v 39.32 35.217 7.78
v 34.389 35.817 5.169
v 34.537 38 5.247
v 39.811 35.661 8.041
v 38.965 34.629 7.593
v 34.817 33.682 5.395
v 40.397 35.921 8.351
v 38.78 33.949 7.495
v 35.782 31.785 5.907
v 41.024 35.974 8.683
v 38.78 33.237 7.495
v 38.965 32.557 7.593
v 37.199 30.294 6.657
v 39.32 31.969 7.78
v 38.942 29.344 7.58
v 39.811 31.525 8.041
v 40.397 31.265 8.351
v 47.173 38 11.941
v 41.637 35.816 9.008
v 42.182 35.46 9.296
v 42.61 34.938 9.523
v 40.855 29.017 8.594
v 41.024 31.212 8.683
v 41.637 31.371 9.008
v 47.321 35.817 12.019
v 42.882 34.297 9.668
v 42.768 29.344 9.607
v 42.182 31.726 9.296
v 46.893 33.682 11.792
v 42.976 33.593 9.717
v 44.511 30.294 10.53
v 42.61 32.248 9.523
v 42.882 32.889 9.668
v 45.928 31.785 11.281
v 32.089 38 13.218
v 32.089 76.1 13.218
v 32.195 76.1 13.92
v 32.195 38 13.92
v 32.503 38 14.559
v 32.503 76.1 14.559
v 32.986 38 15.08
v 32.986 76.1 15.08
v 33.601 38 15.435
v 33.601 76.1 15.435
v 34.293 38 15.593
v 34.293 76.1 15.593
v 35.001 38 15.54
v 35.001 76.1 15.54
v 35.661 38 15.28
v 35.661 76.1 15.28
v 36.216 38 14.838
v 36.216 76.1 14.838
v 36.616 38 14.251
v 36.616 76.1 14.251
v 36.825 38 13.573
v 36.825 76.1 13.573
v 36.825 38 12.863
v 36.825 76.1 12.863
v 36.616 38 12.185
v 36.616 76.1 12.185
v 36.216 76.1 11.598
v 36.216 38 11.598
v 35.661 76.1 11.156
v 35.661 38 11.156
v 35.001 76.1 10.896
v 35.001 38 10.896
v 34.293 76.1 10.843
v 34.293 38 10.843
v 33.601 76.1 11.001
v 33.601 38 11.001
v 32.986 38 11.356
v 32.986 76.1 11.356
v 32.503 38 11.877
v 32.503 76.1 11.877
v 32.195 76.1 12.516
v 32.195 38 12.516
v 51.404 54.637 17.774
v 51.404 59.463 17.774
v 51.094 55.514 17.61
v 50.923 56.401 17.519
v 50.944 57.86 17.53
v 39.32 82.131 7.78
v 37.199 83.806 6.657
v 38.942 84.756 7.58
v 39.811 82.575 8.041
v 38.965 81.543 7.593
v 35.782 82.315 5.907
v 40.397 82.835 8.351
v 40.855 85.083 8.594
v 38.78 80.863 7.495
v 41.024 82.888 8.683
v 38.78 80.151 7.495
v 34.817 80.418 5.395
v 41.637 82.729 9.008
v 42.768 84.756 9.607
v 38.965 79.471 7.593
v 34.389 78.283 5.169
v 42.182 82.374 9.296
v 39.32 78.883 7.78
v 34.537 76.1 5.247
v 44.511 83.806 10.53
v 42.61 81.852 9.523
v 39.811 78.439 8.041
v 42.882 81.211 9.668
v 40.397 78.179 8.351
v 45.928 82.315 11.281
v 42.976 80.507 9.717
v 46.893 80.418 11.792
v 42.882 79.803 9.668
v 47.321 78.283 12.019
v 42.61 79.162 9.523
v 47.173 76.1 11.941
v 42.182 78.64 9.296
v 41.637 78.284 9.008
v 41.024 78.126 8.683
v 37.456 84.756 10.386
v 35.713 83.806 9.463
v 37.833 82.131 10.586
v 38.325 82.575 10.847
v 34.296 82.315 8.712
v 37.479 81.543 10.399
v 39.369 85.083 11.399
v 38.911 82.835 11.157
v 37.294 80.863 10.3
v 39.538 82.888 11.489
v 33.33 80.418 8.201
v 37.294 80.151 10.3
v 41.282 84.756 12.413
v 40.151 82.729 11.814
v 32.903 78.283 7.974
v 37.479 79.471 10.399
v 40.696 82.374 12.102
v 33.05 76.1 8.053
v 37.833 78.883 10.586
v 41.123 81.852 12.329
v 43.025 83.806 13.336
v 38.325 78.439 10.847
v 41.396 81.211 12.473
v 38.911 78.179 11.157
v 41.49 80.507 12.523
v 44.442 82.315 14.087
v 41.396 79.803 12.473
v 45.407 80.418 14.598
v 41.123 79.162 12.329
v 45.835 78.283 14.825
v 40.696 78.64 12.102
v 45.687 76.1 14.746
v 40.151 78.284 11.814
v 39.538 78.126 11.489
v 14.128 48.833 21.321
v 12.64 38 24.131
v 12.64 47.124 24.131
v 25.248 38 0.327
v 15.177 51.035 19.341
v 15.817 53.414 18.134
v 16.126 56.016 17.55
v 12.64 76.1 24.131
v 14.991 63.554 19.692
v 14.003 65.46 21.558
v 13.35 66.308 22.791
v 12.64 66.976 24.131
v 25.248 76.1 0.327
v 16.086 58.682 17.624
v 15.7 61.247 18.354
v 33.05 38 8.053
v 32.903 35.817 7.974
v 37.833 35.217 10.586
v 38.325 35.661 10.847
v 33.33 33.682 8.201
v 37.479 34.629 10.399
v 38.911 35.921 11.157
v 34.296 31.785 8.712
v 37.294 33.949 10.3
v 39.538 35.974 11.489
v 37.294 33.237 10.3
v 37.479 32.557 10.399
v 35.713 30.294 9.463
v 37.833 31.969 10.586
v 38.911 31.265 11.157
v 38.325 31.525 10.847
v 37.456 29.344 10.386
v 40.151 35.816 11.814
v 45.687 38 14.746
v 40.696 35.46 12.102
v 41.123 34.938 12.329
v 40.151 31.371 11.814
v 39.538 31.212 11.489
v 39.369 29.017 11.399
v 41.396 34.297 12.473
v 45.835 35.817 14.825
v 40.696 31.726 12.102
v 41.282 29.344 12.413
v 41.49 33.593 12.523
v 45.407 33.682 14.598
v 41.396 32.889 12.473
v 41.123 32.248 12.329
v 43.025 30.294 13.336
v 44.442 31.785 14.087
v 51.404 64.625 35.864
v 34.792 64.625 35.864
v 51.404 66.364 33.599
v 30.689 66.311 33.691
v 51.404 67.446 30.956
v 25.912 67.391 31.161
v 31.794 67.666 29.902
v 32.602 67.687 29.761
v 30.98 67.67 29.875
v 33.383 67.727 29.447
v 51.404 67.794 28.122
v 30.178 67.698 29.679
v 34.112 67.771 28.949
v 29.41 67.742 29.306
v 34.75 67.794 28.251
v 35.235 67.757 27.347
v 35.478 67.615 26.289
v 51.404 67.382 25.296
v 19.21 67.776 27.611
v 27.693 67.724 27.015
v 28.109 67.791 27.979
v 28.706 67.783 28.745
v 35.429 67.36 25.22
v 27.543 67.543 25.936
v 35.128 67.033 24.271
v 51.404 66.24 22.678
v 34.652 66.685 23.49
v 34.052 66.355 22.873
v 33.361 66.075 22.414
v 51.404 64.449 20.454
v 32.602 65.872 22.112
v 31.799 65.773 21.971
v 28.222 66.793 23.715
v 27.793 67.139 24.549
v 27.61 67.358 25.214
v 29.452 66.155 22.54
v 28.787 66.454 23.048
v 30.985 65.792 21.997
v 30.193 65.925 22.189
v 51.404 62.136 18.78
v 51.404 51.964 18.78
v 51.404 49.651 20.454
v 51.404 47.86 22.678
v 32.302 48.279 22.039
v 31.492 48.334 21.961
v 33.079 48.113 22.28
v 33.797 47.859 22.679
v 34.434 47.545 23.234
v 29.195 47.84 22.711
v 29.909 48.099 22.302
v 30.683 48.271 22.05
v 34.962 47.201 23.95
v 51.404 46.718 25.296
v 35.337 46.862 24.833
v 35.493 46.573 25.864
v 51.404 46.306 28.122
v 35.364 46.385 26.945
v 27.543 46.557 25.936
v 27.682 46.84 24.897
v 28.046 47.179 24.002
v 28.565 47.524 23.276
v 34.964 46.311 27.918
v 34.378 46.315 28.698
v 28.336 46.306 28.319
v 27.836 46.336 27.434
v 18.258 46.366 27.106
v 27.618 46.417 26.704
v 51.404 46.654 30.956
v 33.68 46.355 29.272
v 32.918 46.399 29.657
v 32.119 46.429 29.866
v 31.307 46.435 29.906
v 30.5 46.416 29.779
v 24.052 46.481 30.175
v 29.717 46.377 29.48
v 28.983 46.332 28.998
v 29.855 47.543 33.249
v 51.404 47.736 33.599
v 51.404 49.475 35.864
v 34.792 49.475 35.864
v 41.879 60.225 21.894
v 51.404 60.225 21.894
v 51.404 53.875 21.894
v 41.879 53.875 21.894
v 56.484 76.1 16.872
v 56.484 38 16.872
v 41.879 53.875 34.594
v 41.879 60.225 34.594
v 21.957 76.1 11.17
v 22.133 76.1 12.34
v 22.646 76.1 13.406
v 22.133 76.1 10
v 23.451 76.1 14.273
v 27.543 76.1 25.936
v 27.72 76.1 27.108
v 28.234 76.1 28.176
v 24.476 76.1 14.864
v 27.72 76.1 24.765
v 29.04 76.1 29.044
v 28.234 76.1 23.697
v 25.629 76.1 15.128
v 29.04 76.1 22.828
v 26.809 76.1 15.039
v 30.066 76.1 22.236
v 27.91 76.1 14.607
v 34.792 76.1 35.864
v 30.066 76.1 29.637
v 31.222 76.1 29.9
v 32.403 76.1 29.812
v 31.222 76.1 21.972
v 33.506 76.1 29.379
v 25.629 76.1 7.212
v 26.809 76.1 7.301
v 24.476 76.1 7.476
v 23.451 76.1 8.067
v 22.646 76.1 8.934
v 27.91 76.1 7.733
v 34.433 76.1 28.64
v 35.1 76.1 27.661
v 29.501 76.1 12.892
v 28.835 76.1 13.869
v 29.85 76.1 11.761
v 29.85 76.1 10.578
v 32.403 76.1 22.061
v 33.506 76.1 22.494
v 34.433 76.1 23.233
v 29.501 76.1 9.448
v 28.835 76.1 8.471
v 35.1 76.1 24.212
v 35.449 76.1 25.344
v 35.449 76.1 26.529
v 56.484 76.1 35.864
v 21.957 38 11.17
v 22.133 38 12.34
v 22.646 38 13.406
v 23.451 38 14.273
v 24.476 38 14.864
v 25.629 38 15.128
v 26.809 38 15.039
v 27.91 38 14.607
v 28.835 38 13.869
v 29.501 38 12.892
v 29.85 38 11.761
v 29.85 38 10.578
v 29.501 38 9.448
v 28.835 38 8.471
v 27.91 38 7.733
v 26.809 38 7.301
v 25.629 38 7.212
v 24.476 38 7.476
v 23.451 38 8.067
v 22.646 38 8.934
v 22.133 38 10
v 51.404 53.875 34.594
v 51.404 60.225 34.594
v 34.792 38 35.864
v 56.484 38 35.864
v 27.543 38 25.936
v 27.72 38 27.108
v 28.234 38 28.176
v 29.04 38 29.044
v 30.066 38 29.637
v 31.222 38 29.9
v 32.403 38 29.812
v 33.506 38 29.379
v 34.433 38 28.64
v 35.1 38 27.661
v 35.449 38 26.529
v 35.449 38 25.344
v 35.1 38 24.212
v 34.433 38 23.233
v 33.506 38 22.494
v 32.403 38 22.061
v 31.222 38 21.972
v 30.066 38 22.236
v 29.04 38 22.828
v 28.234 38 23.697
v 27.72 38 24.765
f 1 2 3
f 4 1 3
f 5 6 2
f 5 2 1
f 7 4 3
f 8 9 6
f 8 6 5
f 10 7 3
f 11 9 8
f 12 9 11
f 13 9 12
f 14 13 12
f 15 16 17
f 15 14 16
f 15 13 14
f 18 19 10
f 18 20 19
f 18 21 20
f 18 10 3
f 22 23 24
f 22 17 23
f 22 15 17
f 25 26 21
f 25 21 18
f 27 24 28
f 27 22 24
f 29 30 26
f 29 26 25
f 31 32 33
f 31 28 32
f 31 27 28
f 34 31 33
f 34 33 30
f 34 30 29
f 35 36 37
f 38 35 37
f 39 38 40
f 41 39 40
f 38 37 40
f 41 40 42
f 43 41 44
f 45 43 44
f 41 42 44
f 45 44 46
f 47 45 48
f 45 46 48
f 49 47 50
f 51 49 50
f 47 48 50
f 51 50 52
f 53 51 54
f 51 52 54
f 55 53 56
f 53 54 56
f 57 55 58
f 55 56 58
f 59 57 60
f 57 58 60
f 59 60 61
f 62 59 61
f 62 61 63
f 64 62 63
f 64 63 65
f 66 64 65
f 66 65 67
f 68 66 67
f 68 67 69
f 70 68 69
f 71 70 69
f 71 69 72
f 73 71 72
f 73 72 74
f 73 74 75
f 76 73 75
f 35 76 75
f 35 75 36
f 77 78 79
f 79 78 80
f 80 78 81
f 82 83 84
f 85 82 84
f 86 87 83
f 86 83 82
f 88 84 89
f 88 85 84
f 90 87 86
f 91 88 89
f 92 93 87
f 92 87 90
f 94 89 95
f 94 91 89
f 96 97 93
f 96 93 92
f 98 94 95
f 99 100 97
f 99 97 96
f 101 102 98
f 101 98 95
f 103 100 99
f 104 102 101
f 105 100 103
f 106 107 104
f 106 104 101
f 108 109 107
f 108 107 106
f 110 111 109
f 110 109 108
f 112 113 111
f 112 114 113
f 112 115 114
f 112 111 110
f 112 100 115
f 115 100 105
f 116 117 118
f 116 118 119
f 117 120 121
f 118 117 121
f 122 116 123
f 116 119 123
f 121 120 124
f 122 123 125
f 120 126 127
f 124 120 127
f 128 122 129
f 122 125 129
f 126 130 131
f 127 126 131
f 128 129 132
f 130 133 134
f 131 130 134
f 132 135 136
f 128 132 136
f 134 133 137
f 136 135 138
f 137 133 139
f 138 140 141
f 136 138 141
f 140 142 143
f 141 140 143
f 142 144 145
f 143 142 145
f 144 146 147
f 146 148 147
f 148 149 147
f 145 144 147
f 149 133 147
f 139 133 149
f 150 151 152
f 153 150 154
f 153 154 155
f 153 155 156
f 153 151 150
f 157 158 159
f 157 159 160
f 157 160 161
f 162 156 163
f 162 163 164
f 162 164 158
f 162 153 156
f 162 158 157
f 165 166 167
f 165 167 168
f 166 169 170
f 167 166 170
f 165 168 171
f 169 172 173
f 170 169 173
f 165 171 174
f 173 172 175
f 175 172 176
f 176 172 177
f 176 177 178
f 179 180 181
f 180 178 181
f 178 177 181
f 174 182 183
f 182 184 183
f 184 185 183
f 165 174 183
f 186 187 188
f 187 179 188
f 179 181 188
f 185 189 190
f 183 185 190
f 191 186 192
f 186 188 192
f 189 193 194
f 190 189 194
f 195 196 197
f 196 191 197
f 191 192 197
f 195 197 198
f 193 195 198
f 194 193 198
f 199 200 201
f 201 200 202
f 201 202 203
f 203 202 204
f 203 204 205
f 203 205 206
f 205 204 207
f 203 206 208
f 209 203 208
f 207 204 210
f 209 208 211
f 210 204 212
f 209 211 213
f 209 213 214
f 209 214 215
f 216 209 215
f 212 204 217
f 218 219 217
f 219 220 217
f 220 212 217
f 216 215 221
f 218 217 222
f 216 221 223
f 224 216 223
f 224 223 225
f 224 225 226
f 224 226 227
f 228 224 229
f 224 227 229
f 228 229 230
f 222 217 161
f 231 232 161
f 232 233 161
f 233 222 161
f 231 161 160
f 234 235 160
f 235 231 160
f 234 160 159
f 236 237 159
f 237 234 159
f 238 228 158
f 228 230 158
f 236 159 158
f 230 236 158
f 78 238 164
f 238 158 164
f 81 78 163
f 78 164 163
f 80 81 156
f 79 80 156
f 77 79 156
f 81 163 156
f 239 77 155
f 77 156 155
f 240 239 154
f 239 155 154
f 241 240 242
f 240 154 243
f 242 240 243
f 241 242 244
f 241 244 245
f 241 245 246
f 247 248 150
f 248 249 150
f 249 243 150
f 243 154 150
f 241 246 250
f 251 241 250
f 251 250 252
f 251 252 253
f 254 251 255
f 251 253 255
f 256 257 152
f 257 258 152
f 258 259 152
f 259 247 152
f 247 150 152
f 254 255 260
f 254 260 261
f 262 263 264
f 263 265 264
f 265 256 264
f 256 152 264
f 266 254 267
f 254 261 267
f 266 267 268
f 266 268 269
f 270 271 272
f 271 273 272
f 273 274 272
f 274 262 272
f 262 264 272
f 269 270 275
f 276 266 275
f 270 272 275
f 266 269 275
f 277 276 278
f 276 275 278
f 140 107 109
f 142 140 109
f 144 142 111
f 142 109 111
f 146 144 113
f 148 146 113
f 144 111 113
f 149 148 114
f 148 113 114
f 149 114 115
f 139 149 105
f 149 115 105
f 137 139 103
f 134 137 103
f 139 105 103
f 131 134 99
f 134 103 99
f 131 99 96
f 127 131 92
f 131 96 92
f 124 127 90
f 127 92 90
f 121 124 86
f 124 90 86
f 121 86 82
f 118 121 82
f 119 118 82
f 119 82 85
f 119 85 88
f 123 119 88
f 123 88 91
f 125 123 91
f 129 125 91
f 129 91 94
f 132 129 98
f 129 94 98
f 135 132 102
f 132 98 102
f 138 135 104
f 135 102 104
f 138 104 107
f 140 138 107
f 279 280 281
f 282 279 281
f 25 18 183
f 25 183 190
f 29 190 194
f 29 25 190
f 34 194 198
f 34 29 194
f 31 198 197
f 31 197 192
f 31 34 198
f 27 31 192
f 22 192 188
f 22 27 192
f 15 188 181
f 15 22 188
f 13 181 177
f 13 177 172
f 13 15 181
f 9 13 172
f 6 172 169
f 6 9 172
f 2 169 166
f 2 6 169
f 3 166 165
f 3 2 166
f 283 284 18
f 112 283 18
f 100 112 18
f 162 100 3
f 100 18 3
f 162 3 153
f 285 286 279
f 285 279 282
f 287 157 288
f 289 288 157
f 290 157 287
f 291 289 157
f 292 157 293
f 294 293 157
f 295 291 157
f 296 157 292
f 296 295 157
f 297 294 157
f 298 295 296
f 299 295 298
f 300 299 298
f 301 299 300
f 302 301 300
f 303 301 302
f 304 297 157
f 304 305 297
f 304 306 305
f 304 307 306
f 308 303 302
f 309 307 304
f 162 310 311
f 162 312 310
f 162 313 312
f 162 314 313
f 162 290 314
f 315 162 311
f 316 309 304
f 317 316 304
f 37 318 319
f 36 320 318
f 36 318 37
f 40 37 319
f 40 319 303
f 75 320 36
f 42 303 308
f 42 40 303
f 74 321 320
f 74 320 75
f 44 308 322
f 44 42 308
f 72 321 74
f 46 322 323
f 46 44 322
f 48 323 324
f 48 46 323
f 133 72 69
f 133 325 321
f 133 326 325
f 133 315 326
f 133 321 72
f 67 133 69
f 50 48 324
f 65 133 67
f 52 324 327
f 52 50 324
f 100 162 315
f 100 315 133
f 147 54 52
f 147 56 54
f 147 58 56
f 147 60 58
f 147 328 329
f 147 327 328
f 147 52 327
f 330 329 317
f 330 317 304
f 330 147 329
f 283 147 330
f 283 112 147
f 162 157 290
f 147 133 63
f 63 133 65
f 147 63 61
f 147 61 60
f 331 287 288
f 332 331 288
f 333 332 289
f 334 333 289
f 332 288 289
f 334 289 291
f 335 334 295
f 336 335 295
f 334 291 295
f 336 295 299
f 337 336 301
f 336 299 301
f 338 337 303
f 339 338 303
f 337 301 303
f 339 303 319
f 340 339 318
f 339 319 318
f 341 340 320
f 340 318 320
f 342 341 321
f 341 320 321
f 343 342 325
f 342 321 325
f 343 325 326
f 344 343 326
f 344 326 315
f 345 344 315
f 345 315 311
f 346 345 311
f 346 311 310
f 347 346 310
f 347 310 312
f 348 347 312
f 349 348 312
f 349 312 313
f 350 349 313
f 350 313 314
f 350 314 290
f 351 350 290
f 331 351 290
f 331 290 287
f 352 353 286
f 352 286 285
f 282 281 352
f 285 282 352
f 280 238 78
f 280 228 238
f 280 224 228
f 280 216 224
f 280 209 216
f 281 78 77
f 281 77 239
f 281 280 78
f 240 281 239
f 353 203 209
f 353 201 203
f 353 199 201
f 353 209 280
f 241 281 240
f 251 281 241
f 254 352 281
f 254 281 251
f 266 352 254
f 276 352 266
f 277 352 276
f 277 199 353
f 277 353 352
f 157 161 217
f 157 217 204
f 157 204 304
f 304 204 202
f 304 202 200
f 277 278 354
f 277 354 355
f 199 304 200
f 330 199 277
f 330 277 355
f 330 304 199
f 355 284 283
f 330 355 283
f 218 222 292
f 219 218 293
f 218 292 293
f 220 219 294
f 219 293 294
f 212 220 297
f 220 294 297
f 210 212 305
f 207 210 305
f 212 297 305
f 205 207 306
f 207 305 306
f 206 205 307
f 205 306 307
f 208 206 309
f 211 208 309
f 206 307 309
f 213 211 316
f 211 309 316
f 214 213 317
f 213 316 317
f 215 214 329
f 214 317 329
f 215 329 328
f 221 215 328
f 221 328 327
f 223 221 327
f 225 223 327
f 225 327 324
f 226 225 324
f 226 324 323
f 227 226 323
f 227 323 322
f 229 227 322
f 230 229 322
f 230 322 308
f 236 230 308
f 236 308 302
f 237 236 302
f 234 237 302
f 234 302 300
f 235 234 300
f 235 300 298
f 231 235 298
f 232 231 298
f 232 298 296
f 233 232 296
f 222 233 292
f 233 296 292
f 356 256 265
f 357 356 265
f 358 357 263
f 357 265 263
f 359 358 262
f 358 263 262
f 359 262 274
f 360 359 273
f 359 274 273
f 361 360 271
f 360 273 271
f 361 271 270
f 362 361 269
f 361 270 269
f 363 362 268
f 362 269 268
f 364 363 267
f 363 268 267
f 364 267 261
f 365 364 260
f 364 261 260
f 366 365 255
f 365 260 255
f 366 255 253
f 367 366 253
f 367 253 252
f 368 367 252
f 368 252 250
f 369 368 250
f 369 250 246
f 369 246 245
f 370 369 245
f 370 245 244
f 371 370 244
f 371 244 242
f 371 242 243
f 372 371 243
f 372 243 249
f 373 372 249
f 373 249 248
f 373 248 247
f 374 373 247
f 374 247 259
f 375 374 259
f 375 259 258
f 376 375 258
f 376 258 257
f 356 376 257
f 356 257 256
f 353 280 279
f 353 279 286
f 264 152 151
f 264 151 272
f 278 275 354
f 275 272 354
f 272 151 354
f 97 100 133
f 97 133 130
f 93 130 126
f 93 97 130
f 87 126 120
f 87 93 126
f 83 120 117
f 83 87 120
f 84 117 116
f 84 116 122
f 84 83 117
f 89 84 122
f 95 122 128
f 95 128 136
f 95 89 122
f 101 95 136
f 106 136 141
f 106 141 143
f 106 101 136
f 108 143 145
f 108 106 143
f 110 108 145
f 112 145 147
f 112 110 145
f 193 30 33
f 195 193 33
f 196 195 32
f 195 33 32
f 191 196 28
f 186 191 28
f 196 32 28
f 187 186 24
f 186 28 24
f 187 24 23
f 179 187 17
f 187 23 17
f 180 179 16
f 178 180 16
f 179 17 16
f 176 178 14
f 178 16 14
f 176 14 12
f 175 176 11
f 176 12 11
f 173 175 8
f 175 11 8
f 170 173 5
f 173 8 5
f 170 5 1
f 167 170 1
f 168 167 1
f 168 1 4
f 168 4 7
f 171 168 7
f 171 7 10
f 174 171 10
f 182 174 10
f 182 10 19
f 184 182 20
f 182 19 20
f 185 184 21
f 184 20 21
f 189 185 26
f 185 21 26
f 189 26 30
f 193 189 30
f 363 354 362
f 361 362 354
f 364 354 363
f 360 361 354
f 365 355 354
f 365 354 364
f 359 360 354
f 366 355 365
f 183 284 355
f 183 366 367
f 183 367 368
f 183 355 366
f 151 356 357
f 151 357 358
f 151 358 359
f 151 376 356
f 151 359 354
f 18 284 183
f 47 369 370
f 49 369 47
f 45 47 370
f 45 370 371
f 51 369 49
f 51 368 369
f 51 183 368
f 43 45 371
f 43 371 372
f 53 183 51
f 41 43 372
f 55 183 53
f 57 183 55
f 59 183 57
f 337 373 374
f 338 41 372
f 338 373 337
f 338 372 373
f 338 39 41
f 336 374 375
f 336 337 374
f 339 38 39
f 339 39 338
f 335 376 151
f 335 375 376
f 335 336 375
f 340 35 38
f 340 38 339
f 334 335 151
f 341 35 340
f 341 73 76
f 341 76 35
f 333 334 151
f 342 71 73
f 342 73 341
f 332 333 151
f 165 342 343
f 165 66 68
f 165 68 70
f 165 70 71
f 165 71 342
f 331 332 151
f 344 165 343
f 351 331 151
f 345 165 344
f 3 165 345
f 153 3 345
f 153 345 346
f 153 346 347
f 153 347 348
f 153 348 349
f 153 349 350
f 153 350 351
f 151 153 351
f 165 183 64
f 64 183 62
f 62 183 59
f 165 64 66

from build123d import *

# Parameters (mm, degrees)
F0_W      = 50.8
F0_H      = 38.1
F1_DEPTH  = 50.8
F3_R      = 10.7442
F4_DEPTH  = 40.64
F5_DEPTH  = 45.72
F7_DEPTH  = 38.101
F9_W      = 6.35
F9_H      = 12.7
F10_DEPTH = 9.525
F11_DEPTH = 38.101
F13_DEPTH = 38.101
F20_R     = 2.38125
F20_R_2   = 3.96875
F20_R_3   = 3.9751
F21_DEPTH = 38.101
F22_DEPTH = 3.175
F23_R     = 2.3876
F24_DEPTH = 3.175


# Not quite as in the source:
# - a feature names something its author has since deleted; it is built from what else it names


with BuildPart() as f1:
    # F0 (on Top) → F1 (new body)
    with BuildSketch(Plane.XY):
        with Locations((25.4, -19.05)):
            Rectangle(F0_W, F0_H)
    extrude(amount=F1_DEPTH)

    # F3 (on face) → F4 (cut)
    with BuildSketch(Plane(origin=(0, 0, 0), x_dir=(0, -1, 0), z_dir=(-1, 0, 0))):
        with Locations((19.05, 43.18)):
            Circle(F3_R)
    extrude(amount=-F4_DEPTH, mode=Mode.SUBTRACT)

    # F3 (on face) → F5 (cut)
    with BuildSketch(Plane(origin=(0, 0, 0), x_dir=(0, -1, 0), z_dir=(-1, 0, 0))):
        with Locations((19.05, 43.18)):
            Circle(F3_R)
    extrude(amount=-F5_DEPTH, mode=Mode.SUBTRACT)

    # F6 (on face) → F7 (cut, through all)
    with BuildSketch(Plane.XZ.offset(38.1)):
        Polygon((-5.2975248545, 32.5760431588), (29.6258907765, 51.0742887855), (29.3069556355, 56.4961917698), (-5.2975248545, 56.4961917698), align=None)
    extrude(amount=-F7_DEPTH, mode=Mode.SUBTRACT)

    # F9 (on face) → F10 (join)
    with BuildSketch(Plane(origin=(45.72, 0, 0), x_dir=(0, -1, 0), z_dir=(-1, 0, 0))):
        with Locations((19.05, 43.18)):
            Rectangle(F9_W, F9_H)
    extrude(amount=F10_DEPTH)

    # F8 (on face) → F11 (cut, through all)
    with BuildSketch(Plane.XZ.offset(38.1)):
        Polygon((12.6081767879, 11.5786670478), (0, 35.3820377673), (-3.8052792661, 35.2523848414), (-3.8052792661, -3.7349041086), (52.9321556466, -3.7349041086), (52.9321556466, 32.9374846805), align=None)
    extrude(amount=-F11_DEPTH, mode=Mode.SUBTRACT)

    # F12 (on face) → F13 (cut, through all)
    with BuildSketch(Plane.XZ.offset(38.1)):
        Polygon((21.0712682456, 12.4185690656), (5.5156808657, 41.7864482914), (-6.4950456949, 35.4714418711), (9.0799157449, 6.0669857527), align=None)
    extrude(amount=-F13_DEPTH, mode=Mode.SUBTRACT)


with BuildPart() as f1_1:
    # F14: moved
    add(f1.part.moved(Location((12.8, 76.1, -11.5))))


with BuildPart() as f1_2:
    # F16: moved
    add(f1_1.part.moved(Location((-7.9, 0, 0))))


with BuildPart() as f1_3:
    # F17: moved
    add(f1_2.part.moved(Location((1.3, 0, -3.7))))


with BuildPart() as f1_4:
    # F18: moved
    add(f1_3.part.moved(Location((0.5, 0, -3.8))))


with BuildPart() as f1_5:
    # F19: moved
    add(f1_4.part.moved(Location((-1.016, 0, 4.064))))

    # F20 (on face) → F21 (cut, through all)
    with BuildSketch(Plane(origin=(0, 76.1, 0), x_dir=(-1, 0, 0), z_dir=(0, 1, 0))):
        with Locations((-34.4707481563, 13.2179586217)):
            Circle(F20_R)
        with Locations((-25.9255170822, 11.1699821427)):
            Circle(F20_R_2)
        with Locations((-31.5185599029, 25.9363166988)):
            Circle(F20_R_3)
    extrude(amount=-F21_DEPTH, mode=Mode.SUBTRACT)

    # F22 (add): a face of the model
    f22_faces = [f1_5.faces().sort_by_distance(p)[0] for p in [
        (40.8662395369, 57.05, 8.5997036085),
    ]]
    extrude(f22_faces, amount=-F22_DEPTH)

    # F23 (on face) → F24 (join)
    with BuildSketch(Plane(origin=(5.3963751445, 0, -10.1879851676), x_dir=(0.8836897656, 0, 0.4680730692), z_dir=(0.4680730692, 0, -0.8836897656))):
        with BuildLine():
            Line((32.9755673007, -38), (47.2757673007, -38))
            ThreePointArc((47.2757673007, -38), (40.1256673007, -29.0169325565), (32.9755673007, -38))
        make_face()
        with Locations((40.1383673007, -33.5931)):
            Circle(F23_R, mode=Mode.SUBTRACT)
        with BuildLine():
            ThreePointArc((32.9755673007, -76.1), (40.1256673007, -85.0830674435), (47.2757673007, -76.1))
            Line((47.2757673007, -76.1), (32.9755673007, -76.1))
        make_face()
        with Locations((40.1383673007, -80.5069)):
            Circle(F23_R, mode=Mode.SUBTRACT)
    extrude(amount=-F24_DEPTH)


solid = f1_5.part
